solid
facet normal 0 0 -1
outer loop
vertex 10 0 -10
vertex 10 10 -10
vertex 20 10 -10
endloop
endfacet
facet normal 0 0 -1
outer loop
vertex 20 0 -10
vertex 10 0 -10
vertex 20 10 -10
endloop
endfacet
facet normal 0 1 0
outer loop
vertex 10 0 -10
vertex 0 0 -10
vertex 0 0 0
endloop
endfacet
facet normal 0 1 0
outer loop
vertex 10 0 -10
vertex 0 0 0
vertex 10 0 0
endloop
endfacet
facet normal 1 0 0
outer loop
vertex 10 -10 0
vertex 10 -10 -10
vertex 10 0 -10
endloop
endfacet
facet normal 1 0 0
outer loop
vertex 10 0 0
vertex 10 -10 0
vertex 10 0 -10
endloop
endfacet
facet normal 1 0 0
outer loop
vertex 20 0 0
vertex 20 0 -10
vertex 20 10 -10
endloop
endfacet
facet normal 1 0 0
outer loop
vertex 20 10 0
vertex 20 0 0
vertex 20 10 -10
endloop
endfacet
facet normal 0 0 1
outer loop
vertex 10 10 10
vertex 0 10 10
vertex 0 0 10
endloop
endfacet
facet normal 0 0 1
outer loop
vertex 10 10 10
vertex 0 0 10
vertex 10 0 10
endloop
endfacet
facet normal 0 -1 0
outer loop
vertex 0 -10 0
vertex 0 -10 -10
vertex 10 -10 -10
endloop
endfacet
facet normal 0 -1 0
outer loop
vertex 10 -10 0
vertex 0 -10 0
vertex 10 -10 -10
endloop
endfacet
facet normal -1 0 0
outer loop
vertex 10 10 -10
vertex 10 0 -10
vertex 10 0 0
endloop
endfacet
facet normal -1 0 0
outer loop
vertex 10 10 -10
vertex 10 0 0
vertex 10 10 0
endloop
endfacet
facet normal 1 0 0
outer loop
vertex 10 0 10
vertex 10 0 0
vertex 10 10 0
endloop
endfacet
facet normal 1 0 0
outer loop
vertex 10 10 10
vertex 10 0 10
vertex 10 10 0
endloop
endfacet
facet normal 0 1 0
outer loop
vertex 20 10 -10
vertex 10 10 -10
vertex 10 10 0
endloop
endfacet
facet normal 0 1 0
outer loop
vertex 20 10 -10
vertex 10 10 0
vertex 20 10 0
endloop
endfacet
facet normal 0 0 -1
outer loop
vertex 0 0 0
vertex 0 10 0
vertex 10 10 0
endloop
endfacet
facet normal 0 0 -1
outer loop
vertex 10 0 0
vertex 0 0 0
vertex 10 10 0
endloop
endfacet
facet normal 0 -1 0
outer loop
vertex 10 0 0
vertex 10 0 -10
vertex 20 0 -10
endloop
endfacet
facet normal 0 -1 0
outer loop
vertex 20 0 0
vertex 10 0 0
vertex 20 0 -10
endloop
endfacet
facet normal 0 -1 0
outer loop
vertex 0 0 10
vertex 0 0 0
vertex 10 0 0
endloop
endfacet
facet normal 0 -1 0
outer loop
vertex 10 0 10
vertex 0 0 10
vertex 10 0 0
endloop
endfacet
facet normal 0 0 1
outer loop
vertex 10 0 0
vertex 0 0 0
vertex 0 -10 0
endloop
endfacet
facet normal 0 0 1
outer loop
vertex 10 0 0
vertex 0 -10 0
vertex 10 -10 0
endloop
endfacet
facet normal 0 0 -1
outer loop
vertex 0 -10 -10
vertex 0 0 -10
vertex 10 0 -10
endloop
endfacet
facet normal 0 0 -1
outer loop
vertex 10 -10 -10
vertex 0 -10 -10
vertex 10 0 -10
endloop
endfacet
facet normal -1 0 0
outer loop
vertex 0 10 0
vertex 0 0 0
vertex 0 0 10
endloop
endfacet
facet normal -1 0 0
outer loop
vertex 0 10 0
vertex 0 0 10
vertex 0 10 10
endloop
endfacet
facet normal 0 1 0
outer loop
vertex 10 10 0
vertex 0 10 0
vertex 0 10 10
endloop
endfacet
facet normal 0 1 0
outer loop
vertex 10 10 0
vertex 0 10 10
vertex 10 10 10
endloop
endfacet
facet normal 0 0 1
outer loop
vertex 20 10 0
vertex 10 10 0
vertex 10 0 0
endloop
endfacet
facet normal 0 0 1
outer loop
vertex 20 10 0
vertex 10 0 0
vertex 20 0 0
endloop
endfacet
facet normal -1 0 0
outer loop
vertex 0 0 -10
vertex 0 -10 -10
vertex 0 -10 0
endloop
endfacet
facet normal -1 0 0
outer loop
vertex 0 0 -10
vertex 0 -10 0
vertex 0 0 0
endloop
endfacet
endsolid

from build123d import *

# Parameters (mm, degrees)
BOX_W        = 10
BOX_H        = 10
BOX_DEPTH    = 10
BOX001_W     = 10
BOX001_H     = 10
BOX001_DEPTH = 10
BOX002_W     = 10
BOX002_H     = 10
BOX002_DEPTH = 10


with BuildPart() as nivel1_cubo1:
    # Box → Box (new body)
    with BuildSketch(Plane.XY):
        with Locations((5, 5)):
            Rectangle(BOX_W, BOX_H)
    extrude(amount=BOX_DEPTH)


with BuildPart() as nivel2_cubo1:
    # Box001 → Box001 (new body)
    with BuildSketch(Plane(origin=(0, -10, -10), x_dir=(1, 0, 0), z_dir=(0, 0, 1))):
        with Locations((5, 5)):
            Rectangle(BOX001_W, BOX001_H)
    extrude(amount=BOX001_DEPTH)


with BuildPart() as nivel2_cubo2:
    # Box002 → Box002 (new body)
    with BuildSketch(Plane(origin=(10, 0, -10), x_dir=(1, 0, 0), z_dir=(0, 0, 1))):
        with Locations((5, 5)):
            Rectangle(BOX002_W, BOX002_H)
    extrude(amount=BOX002_DEPTH)


solid = Compound([nivel1_cubo1.part, nivel2_cubo1.part, nivel2_cubo2.part])
